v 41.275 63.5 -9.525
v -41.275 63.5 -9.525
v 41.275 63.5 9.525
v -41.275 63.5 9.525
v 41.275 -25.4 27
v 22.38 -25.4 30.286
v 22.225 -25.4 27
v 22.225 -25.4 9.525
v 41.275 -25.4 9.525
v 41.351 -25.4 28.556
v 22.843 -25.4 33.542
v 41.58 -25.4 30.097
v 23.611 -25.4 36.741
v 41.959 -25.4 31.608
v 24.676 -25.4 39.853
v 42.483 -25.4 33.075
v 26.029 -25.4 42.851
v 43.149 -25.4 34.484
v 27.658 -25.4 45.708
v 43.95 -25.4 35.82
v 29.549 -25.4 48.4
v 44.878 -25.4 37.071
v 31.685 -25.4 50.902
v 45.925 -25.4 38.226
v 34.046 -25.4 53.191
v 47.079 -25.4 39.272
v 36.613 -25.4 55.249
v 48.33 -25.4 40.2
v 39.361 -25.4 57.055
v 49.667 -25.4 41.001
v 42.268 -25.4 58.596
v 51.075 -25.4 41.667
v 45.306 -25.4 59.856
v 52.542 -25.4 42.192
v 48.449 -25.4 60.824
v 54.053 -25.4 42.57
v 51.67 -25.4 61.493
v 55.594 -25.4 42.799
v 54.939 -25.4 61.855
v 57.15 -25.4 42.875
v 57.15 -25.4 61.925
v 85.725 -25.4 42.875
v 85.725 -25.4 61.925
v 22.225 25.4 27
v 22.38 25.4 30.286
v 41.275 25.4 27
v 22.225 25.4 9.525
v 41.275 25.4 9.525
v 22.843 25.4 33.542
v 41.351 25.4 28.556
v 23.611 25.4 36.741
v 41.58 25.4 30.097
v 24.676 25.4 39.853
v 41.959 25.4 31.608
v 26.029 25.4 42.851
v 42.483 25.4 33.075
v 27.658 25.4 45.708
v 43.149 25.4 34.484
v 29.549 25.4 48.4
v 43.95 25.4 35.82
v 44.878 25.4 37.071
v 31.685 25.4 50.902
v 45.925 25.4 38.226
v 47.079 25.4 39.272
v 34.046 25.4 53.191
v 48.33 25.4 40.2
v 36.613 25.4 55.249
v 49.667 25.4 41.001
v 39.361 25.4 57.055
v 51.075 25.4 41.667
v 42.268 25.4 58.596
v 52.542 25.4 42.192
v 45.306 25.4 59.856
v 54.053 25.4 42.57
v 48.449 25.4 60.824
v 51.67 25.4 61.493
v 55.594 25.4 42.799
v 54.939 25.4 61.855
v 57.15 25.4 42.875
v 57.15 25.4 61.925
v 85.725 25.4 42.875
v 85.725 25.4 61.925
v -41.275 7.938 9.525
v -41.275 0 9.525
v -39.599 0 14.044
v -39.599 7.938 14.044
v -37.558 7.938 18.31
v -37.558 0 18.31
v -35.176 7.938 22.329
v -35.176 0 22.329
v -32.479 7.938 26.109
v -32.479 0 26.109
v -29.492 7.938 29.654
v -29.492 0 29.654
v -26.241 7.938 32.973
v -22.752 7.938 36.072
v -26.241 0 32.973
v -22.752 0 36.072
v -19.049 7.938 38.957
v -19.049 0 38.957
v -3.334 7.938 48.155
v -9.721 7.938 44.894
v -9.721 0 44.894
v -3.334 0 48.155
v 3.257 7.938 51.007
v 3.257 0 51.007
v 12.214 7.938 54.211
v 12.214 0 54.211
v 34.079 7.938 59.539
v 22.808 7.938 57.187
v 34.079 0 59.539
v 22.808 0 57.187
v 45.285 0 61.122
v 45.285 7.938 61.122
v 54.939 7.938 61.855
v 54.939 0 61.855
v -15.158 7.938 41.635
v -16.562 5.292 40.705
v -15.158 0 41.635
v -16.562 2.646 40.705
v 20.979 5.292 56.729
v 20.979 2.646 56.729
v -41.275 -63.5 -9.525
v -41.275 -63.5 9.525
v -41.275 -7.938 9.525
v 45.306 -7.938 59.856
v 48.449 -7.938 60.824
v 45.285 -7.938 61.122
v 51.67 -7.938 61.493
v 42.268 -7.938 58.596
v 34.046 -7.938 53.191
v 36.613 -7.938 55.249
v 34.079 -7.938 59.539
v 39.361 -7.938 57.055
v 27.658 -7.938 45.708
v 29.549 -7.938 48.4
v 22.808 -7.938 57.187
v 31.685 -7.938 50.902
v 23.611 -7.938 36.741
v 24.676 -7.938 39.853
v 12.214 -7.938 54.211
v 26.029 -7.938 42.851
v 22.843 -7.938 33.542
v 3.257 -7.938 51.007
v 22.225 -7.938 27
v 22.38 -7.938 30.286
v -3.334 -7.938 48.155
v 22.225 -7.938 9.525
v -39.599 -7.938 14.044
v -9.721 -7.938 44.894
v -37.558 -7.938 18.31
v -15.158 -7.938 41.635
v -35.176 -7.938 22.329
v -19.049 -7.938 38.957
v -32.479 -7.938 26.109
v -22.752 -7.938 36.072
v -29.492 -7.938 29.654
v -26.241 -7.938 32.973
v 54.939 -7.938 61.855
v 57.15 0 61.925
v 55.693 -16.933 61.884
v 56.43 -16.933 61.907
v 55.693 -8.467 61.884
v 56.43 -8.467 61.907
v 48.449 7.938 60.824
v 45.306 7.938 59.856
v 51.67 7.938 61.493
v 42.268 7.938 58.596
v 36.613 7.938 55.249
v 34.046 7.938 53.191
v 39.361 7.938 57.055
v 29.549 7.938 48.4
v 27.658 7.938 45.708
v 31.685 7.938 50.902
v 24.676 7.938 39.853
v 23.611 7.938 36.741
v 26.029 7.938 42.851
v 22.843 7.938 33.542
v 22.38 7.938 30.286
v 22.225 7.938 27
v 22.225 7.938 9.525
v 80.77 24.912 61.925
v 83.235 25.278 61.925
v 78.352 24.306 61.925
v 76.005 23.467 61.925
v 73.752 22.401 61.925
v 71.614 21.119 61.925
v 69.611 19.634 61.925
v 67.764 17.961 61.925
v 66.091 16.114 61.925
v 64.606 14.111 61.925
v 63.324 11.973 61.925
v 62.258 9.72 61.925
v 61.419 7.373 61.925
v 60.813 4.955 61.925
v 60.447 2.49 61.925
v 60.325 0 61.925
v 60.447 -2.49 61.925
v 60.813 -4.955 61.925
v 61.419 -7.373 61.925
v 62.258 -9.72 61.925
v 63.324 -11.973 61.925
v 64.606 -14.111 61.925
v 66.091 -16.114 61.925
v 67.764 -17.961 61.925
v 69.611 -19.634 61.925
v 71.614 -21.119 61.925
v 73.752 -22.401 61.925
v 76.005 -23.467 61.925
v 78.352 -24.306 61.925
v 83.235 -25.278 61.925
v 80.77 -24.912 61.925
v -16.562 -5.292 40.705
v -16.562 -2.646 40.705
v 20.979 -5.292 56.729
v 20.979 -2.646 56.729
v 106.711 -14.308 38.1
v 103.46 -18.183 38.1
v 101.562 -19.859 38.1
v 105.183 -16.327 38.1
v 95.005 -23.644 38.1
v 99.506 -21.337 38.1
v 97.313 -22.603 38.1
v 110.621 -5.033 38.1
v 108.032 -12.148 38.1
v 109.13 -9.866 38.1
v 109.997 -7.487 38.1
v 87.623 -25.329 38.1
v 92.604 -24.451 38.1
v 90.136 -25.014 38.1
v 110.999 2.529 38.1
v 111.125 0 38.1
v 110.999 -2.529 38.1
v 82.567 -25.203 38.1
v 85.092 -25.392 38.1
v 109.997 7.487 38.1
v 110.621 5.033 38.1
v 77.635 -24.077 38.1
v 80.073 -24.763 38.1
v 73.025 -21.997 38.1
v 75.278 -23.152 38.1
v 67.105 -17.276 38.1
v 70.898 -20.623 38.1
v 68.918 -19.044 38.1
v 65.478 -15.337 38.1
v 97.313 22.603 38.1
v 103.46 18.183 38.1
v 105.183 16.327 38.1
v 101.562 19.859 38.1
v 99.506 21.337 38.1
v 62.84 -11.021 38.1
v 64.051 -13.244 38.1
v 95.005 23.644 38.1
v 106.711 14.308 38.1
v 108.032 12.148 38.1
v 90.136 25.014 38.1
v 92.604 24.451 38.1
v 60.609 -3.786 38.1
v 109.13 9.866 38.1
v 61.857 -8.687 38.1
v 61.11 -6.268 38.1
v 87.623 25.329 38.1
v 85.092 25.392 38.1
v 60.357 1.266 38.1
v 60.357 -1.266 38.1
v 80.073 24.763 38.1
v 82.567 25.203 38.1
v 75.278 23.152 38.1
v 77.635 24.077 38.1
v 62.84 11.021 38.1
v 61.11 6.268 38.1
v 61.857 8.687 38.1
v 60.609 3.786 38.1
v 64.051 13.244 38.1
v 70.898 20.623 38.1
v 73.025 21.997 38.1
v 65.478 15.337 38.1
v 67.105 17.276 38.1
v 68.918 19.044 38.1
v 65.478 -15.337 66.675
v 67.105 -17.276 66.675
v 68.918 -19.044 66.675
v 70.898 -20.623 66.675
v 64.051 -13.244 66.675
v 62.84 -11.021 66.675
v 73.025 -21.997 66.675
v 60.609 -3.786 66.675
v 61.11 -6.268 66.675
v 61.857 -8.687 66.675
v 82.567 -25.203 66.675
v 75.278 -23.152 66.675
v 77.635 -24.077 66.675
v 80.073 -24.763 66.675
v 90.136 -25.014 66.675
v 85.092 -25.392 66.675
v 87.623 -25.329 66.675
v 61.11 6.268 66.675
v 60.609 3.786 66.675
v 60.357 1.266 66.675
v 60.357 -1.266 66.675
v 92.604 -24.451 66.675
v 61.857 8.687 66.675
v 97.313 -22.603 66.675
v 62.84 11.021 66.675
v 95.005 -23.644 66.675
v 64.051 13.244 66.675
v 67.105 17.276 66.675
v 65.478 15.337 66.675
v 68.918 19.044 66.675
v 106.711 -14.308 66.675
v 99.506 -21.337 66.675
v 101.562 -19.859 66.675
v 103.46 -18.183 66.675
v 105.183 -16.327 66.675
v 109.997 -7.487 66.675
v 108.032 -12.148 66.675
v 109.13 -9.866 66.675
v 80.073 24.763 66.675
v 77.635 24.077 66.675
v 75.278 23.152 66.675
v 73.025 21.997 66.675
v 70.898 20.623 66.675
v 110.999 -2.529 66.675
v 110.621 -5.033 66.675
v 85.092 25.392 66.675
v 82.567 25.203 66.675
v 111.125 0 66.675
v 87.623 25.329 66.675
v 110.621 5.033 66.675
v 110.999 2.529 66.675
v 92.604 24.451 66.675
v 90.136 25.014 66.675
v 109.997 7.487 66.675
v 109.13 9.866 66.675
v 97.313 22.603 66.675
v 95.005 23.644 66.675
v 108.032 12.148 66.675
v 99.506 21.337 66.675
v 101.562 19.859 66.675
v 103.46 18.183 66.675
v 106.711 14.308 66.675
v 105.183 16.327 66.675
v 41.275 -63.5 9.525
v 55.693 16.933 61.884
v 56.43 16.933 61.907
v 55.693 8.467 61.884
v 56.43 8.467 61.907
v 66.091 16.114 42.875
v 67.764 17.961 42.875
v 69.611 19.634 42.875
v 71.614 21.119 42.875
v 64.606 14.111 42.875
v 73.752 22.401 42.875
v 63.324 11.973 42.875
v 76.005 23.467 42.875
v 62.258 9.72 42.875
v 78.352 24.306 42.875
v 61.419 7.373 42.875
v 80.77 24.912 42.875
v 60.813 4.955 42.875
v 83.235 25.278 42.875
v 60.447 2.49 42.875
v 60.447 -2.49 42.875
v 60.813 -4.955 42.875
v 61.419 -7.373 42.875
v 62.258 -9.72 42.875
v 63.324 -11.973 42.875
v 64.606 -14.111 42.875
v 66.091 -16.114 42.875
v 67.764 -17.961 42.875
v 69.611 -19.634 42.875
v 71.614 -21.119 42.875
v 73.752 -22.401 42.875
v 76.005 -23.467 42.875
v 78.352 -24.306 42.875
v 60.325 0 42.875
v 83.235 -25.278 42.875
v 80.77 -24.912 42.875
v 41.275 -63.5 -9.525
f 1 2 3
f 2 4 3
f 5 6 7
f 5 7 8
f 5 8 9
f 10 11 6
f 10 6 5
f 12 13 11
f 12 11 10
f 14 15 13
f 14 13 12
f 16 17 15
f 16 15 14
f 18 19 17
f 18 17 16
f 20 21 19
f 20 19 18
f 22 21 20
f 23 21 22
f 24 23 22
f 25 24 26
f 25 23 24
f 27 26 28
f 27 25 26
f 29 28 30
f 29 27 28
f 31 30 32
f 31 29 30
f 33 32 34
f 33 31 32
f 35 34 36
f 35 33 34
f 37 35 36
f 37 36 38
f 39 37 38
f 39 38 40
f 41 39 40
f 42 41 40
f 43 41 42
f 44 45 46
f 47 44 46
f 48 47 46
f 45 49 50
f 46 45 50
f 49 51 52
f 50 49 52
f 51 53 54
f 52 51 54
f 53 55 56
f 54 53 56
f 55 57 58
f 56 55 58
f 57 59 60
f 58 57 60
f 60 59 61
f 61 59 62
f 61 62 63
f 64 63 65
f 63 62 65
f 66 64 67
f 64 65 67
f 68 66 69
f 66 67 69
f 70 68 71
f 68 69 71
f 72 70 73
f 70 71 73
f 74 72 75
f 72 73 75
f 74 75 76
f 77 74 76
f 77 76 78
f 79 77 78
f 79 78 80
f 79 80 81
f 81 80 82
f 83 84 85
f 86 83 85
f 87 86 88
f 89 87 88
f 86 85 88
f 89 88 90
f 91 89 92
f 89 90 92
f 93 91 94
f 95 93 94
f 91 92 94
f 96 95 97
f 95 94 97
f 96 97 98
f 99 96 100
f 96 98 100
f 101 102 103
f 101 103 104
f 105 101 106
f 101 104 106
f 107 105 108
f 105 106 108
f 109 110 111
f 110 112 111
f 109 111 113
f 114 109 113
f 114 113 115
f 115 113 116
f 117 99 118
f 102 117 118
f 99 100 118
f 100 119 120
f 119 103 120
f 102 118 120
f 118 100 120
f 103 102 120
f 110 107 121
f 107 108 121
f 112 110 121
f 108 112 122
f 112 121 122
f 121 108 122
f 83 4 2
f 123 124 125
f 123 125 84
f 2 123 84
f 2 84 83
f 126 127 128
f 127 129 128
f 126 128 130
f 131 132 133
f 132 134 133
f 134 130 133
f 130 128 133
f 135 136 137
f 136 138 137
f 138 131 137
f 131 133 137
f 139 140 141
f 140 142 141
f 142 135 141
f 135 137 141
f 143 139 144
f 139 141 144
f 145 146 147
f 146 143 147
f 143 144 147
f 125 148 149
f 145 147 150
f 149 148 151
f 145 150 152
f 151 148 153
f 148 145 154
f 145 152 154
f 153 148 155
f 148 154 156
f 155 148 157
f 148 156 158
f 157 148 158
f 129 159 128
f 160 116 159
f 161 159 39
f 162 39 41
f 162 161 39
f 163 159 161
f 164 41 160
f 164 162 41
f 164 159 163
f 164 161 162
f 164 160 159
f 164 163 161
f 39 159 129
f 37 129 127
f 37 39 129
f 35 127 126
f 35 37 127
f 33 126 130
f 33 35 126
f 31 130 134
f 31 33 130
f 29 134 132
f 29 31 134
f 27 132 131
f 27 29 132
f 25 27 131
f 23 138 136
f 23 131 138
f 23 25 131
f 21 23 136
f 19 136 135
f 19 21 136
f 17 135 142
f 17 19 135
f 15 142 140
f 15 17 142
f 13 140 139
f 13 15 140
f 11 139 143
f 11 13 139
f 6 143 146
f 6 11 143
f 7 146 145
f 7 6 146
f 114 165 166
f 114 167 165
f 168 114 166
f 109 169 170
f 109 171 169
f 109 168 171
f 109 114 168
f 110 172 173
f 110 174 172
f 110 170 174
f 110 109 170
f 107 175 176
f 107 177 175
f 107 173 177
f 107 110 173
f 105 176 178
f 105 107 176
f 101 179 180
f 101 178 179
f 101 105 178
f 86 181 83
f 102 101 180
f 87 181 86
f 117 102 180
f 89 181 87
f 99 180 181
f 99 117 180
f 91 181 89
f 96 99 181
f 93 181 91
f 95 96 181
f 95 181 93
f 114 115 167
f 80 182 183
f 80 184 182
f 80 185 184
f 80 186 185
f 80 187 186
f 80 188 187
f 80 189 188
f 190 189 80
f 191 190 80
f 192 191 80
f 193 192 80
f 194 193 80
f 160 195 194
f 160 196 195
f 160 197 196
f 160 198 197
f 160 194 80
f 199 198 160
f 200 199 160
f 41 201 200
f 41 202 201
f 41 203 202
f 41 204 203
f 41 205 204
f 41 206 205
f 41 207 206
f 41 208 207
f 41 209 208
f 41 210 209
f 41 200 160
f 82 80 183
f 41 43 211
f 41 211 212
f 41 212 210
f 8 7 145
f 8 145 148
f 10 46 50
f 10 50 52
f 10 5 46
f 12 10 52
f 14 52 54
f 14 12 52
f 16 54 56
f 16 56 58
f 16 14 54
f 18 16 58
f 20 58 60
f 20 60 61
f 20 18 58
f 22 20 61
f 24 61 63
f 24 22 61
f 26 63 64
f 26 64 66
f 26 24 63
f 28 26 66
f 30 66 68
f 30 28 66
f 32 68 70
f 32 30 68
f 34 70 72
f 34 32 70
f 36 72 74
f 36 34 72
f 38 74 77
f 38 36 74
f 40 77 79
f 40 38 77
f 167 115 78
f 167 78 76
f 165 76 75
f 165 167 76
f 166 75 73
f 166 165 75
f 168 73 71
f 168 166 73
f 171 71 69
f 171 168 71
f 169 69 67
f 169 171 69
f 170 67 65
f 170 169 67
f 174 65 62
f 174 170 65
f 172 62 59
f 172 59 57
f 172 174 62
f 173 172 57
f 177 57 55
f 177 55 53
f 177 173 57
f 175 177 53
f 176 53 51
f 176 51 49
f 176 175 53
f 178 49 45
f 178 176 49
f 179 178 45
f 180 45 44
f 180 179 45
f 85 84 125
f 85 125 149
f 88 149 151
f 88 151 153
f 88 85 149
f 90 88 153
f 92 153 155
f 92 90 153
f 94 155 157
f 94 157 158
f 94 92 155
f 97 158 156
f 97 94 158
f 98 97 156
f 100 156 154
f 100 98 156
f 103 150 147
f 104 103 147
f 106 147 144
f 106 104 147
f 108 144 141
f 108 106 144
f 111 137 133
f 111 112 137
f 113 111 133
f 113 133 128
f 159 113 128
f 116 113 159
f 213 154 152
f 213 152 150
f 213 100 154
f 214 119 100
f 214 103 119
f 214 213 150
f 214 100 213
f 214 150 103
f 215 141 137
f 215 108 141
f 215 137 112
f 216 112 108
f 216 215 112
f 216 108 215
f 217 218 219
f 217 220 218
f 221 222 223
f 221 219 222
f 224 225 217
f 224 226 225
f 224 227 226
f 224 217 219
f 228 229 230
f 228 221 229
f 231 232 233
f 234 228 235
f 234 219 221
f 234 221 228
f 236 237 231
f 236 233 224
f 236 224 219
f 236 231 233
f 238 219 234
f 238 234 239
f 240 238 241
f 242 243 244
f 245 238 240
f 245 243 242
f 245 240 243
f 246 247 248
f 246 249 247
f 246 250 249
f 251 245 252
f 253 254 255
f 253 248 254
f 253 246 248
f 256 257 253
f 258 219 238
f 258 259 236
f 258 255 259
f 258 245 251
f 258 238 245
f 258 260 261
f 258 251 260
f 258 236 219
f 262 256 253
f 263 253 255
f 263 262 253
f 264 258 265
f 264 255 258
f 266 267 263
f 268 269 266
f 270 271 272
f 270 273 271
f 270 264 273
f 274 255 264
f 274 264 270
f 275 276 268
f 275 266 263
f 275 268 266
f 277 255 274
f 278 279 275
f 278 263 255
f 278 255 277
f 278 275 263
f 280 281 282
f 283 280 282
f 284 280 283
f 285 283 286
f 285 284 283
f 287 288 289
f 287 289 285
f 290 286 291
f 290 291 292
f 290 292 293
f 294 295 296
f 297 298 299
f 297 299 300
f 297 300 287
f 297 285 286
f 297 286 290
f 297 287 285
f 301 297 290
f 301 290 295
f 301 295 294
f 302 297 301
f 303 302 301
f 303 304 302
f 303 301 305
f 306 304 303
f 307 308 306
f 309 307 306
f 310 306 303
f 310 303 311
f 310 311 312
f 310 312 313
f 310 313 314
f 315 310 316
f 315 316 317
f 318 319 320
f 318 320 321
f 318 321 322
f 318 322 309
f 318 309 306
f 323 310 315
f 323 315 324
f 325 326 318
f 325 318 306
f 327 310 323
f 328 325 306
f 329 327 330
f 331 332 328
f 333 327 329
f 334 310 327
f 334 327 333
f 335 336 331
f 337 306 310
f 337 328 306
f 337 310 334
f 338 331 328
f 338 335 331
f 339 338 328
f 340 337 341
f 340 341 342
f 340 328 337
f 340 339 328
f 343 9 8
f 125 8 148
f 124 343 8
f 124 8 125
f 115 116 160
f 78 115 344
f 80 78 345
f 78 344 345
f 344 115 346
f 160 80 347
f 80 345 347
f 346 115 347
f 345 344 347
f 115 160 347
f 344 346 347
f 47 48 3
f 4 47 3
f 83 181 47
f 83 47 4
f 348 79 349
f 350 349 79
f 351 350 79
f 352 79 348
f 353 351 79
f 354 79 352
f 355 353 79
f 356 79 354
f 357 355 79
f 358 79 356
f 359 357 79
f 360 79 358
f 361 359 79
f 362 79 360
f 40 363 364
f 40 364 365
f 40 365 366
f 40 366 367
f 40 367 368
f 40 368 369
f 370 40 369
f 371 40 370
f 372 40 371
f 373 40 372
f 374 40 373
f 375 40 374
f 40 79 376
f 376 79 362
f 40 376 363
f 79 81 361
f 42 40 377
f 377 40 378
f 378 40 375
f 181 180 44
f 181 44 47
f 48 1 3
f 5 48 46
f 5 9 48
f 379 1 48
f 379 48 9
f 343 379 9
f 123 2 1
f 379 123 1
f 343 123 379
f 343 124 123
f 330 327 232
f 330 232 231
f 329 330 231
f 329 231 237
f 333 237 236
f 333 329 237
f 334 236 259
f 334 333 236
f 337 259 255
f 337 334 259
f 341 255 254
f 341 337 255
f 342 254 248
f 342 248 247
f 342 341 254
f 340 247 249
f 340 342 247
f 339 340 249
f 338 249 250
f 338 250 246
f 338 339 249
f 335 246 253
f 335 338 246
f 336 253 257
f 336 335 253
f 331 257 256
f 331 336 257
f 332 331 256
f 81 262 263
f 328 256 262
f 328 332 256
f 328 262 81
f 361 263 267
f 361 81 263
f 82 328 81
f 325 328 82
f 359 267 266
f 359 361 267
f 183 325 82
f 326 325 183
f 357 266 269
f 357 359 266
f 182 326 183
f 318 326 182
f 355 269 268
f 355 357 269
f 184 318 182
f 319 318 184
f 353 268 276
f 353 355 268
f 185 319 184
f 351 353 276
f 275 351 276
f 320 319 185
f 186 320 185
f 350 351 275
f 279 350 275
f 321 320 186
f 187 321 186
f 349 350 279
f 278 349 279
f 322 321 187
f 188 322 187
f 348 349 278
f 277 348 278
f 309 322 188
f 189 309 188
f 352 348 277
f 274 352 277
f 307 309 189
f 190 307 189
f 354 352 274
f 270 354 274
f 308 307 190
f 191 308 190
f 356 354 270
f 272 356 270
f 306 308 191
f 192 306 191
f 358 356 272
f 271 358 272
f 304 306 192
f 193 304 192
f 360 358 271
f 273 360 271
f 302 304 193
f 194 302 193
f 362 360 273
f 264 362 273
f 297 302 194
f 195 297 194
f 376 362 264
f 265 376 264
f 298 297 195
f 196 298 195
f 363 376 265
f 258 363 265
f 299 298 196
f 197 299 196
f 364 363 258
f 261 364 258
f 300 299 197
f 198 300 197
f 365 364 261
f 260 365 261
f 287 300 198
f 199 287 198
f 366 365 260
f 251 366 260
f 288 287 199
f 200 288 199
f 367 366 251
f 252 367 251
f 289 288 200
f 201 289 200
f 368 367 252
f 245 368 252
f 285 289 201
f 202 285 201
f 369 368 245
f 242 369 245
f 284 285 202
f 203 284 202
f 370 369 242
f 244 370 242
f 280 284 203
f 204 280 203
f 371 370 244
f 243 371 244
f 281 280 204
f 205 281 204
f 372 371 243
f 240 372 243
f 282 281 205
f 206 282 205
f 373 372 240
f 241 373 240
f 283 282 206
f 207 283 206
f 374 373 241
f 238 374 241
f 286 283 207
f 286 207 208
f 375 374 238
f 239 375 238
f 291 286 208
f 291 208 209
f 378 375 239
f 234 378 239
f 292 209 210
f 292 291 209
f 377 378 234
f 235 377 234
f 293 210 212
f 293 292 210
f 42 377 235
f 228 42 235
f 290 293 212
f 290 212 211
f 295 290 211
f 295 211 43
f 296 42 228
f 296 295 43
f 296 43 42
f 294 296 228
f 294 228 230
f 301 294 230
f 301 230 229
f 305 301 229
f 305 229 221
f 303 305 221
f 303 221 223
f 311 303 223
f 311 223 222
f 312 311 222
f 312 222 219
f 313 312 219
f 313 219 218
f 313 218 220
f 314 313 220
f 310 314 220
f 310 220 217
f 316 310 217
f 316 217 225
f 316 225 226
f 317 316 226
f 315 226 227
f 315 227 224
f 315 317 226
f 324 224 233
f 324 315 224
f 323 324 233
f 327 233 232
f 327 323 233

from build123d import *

# Parameters (mm, degrees)
F1_DEPTH = 63.5
F0_W     = 25.4
F0_H     = 19.05
F2_DEPTH = 25.4
F3_DEPTH = 7.9375


with BuildPart() as f1:
    # F0 (on Front) → F1 (new body, symmetric)
    with BuildSketch(Plane.XZ):
        Polygon((-41.275, -9.525), (41.275, -9.525), (41.275, 9.525), (22.225, 9.525), (-41.275, 9.525), align=None)
    extrude(amount=F1_DEPTH, both=True)

    # F0 (on Front) → F2 (join, symmetric)
    with BuildSketch(Plane.XZ):
        with Locations((73.025, 52.4002)):
            Rectangle(F0_W, F0_H)
        with BuildLine():
            Line((22.225, 9.525), (41.275, 9.525))
            Line((41.275, 9.525), (41.275, 27.0002))
            ThreePointArc((41.275, 27.0002), (45.9246798487, 38.2255201513), (57.15, 42.8752))
            Line((57.15, 42.8752), (60.325, 42.8752))
            Line((60.325, 42.8752), (60.325, 61.9252))
            Line((60.325, 61.9252), (57.15, 61.9252))
            add(Edge.make_bspline(
                [(54.9392255171, 61.8551580574), (55.7011340945, 61.8864647718), (56.4386307378, 61.9096636569), (57.15, 61.9252)],
                knots=[108.4110637299, 108.4110637299, 108.4110637299, 108.4110637299, 111.5045361635, 111.5045361635, 111.5045361635, 111.5045361635], degree=3))
            ThreePointArc((54.9392255171, 61.8551580574), (31.6846615591, 50.9015004477), (22.225, 27.0002))
            Line((22.225, 27.0002), (22.225, 9.525))
        make_face()
    extrude(amount=F2_DEPTH, both=True)

    # F0 (on Front) → F3 (join, symmetric)
    with BuildSketch(Plane.XZ):
        with BuildLine():
            add(Edge.make_bspline(
                [(-41.275, 9.525), (-28.4448499709, 49.7031577837), (28.2380600433, 60.7580109912), (54.9392255171, 61.8551580574)],
                knots=[0, 0, 0, 0, 108.4110637299, 108.4110637299, 108.4110637299, 108.4110637299], degree=3))
            Line((-41.275, 9.525), (22.225, 9.525))
            Line((22.225, 9.525), (22.225, 27.0002))
            ThreePointArc((22.225, 27.0002), (31.6846615591, 50.9015004477), (54.9392255171, 61.8551580574))
        make_face()
    extrude(amount=F3_DEPTH, both=True)

    # F0 (on Front) → F4 (revolve)
    with BuildSketch(Plane.XZ):
        Polygon((85.725, 61.9252), (85.725, 42.8752), (85.725, 38.1), (111.125, 38.1), (111.125, 66.675), (85.725, 66.675), align=None)
    revolve(axis=Axis((85.725, 0, 52.3875), (0, 0, 1)))


solid = f1.part
